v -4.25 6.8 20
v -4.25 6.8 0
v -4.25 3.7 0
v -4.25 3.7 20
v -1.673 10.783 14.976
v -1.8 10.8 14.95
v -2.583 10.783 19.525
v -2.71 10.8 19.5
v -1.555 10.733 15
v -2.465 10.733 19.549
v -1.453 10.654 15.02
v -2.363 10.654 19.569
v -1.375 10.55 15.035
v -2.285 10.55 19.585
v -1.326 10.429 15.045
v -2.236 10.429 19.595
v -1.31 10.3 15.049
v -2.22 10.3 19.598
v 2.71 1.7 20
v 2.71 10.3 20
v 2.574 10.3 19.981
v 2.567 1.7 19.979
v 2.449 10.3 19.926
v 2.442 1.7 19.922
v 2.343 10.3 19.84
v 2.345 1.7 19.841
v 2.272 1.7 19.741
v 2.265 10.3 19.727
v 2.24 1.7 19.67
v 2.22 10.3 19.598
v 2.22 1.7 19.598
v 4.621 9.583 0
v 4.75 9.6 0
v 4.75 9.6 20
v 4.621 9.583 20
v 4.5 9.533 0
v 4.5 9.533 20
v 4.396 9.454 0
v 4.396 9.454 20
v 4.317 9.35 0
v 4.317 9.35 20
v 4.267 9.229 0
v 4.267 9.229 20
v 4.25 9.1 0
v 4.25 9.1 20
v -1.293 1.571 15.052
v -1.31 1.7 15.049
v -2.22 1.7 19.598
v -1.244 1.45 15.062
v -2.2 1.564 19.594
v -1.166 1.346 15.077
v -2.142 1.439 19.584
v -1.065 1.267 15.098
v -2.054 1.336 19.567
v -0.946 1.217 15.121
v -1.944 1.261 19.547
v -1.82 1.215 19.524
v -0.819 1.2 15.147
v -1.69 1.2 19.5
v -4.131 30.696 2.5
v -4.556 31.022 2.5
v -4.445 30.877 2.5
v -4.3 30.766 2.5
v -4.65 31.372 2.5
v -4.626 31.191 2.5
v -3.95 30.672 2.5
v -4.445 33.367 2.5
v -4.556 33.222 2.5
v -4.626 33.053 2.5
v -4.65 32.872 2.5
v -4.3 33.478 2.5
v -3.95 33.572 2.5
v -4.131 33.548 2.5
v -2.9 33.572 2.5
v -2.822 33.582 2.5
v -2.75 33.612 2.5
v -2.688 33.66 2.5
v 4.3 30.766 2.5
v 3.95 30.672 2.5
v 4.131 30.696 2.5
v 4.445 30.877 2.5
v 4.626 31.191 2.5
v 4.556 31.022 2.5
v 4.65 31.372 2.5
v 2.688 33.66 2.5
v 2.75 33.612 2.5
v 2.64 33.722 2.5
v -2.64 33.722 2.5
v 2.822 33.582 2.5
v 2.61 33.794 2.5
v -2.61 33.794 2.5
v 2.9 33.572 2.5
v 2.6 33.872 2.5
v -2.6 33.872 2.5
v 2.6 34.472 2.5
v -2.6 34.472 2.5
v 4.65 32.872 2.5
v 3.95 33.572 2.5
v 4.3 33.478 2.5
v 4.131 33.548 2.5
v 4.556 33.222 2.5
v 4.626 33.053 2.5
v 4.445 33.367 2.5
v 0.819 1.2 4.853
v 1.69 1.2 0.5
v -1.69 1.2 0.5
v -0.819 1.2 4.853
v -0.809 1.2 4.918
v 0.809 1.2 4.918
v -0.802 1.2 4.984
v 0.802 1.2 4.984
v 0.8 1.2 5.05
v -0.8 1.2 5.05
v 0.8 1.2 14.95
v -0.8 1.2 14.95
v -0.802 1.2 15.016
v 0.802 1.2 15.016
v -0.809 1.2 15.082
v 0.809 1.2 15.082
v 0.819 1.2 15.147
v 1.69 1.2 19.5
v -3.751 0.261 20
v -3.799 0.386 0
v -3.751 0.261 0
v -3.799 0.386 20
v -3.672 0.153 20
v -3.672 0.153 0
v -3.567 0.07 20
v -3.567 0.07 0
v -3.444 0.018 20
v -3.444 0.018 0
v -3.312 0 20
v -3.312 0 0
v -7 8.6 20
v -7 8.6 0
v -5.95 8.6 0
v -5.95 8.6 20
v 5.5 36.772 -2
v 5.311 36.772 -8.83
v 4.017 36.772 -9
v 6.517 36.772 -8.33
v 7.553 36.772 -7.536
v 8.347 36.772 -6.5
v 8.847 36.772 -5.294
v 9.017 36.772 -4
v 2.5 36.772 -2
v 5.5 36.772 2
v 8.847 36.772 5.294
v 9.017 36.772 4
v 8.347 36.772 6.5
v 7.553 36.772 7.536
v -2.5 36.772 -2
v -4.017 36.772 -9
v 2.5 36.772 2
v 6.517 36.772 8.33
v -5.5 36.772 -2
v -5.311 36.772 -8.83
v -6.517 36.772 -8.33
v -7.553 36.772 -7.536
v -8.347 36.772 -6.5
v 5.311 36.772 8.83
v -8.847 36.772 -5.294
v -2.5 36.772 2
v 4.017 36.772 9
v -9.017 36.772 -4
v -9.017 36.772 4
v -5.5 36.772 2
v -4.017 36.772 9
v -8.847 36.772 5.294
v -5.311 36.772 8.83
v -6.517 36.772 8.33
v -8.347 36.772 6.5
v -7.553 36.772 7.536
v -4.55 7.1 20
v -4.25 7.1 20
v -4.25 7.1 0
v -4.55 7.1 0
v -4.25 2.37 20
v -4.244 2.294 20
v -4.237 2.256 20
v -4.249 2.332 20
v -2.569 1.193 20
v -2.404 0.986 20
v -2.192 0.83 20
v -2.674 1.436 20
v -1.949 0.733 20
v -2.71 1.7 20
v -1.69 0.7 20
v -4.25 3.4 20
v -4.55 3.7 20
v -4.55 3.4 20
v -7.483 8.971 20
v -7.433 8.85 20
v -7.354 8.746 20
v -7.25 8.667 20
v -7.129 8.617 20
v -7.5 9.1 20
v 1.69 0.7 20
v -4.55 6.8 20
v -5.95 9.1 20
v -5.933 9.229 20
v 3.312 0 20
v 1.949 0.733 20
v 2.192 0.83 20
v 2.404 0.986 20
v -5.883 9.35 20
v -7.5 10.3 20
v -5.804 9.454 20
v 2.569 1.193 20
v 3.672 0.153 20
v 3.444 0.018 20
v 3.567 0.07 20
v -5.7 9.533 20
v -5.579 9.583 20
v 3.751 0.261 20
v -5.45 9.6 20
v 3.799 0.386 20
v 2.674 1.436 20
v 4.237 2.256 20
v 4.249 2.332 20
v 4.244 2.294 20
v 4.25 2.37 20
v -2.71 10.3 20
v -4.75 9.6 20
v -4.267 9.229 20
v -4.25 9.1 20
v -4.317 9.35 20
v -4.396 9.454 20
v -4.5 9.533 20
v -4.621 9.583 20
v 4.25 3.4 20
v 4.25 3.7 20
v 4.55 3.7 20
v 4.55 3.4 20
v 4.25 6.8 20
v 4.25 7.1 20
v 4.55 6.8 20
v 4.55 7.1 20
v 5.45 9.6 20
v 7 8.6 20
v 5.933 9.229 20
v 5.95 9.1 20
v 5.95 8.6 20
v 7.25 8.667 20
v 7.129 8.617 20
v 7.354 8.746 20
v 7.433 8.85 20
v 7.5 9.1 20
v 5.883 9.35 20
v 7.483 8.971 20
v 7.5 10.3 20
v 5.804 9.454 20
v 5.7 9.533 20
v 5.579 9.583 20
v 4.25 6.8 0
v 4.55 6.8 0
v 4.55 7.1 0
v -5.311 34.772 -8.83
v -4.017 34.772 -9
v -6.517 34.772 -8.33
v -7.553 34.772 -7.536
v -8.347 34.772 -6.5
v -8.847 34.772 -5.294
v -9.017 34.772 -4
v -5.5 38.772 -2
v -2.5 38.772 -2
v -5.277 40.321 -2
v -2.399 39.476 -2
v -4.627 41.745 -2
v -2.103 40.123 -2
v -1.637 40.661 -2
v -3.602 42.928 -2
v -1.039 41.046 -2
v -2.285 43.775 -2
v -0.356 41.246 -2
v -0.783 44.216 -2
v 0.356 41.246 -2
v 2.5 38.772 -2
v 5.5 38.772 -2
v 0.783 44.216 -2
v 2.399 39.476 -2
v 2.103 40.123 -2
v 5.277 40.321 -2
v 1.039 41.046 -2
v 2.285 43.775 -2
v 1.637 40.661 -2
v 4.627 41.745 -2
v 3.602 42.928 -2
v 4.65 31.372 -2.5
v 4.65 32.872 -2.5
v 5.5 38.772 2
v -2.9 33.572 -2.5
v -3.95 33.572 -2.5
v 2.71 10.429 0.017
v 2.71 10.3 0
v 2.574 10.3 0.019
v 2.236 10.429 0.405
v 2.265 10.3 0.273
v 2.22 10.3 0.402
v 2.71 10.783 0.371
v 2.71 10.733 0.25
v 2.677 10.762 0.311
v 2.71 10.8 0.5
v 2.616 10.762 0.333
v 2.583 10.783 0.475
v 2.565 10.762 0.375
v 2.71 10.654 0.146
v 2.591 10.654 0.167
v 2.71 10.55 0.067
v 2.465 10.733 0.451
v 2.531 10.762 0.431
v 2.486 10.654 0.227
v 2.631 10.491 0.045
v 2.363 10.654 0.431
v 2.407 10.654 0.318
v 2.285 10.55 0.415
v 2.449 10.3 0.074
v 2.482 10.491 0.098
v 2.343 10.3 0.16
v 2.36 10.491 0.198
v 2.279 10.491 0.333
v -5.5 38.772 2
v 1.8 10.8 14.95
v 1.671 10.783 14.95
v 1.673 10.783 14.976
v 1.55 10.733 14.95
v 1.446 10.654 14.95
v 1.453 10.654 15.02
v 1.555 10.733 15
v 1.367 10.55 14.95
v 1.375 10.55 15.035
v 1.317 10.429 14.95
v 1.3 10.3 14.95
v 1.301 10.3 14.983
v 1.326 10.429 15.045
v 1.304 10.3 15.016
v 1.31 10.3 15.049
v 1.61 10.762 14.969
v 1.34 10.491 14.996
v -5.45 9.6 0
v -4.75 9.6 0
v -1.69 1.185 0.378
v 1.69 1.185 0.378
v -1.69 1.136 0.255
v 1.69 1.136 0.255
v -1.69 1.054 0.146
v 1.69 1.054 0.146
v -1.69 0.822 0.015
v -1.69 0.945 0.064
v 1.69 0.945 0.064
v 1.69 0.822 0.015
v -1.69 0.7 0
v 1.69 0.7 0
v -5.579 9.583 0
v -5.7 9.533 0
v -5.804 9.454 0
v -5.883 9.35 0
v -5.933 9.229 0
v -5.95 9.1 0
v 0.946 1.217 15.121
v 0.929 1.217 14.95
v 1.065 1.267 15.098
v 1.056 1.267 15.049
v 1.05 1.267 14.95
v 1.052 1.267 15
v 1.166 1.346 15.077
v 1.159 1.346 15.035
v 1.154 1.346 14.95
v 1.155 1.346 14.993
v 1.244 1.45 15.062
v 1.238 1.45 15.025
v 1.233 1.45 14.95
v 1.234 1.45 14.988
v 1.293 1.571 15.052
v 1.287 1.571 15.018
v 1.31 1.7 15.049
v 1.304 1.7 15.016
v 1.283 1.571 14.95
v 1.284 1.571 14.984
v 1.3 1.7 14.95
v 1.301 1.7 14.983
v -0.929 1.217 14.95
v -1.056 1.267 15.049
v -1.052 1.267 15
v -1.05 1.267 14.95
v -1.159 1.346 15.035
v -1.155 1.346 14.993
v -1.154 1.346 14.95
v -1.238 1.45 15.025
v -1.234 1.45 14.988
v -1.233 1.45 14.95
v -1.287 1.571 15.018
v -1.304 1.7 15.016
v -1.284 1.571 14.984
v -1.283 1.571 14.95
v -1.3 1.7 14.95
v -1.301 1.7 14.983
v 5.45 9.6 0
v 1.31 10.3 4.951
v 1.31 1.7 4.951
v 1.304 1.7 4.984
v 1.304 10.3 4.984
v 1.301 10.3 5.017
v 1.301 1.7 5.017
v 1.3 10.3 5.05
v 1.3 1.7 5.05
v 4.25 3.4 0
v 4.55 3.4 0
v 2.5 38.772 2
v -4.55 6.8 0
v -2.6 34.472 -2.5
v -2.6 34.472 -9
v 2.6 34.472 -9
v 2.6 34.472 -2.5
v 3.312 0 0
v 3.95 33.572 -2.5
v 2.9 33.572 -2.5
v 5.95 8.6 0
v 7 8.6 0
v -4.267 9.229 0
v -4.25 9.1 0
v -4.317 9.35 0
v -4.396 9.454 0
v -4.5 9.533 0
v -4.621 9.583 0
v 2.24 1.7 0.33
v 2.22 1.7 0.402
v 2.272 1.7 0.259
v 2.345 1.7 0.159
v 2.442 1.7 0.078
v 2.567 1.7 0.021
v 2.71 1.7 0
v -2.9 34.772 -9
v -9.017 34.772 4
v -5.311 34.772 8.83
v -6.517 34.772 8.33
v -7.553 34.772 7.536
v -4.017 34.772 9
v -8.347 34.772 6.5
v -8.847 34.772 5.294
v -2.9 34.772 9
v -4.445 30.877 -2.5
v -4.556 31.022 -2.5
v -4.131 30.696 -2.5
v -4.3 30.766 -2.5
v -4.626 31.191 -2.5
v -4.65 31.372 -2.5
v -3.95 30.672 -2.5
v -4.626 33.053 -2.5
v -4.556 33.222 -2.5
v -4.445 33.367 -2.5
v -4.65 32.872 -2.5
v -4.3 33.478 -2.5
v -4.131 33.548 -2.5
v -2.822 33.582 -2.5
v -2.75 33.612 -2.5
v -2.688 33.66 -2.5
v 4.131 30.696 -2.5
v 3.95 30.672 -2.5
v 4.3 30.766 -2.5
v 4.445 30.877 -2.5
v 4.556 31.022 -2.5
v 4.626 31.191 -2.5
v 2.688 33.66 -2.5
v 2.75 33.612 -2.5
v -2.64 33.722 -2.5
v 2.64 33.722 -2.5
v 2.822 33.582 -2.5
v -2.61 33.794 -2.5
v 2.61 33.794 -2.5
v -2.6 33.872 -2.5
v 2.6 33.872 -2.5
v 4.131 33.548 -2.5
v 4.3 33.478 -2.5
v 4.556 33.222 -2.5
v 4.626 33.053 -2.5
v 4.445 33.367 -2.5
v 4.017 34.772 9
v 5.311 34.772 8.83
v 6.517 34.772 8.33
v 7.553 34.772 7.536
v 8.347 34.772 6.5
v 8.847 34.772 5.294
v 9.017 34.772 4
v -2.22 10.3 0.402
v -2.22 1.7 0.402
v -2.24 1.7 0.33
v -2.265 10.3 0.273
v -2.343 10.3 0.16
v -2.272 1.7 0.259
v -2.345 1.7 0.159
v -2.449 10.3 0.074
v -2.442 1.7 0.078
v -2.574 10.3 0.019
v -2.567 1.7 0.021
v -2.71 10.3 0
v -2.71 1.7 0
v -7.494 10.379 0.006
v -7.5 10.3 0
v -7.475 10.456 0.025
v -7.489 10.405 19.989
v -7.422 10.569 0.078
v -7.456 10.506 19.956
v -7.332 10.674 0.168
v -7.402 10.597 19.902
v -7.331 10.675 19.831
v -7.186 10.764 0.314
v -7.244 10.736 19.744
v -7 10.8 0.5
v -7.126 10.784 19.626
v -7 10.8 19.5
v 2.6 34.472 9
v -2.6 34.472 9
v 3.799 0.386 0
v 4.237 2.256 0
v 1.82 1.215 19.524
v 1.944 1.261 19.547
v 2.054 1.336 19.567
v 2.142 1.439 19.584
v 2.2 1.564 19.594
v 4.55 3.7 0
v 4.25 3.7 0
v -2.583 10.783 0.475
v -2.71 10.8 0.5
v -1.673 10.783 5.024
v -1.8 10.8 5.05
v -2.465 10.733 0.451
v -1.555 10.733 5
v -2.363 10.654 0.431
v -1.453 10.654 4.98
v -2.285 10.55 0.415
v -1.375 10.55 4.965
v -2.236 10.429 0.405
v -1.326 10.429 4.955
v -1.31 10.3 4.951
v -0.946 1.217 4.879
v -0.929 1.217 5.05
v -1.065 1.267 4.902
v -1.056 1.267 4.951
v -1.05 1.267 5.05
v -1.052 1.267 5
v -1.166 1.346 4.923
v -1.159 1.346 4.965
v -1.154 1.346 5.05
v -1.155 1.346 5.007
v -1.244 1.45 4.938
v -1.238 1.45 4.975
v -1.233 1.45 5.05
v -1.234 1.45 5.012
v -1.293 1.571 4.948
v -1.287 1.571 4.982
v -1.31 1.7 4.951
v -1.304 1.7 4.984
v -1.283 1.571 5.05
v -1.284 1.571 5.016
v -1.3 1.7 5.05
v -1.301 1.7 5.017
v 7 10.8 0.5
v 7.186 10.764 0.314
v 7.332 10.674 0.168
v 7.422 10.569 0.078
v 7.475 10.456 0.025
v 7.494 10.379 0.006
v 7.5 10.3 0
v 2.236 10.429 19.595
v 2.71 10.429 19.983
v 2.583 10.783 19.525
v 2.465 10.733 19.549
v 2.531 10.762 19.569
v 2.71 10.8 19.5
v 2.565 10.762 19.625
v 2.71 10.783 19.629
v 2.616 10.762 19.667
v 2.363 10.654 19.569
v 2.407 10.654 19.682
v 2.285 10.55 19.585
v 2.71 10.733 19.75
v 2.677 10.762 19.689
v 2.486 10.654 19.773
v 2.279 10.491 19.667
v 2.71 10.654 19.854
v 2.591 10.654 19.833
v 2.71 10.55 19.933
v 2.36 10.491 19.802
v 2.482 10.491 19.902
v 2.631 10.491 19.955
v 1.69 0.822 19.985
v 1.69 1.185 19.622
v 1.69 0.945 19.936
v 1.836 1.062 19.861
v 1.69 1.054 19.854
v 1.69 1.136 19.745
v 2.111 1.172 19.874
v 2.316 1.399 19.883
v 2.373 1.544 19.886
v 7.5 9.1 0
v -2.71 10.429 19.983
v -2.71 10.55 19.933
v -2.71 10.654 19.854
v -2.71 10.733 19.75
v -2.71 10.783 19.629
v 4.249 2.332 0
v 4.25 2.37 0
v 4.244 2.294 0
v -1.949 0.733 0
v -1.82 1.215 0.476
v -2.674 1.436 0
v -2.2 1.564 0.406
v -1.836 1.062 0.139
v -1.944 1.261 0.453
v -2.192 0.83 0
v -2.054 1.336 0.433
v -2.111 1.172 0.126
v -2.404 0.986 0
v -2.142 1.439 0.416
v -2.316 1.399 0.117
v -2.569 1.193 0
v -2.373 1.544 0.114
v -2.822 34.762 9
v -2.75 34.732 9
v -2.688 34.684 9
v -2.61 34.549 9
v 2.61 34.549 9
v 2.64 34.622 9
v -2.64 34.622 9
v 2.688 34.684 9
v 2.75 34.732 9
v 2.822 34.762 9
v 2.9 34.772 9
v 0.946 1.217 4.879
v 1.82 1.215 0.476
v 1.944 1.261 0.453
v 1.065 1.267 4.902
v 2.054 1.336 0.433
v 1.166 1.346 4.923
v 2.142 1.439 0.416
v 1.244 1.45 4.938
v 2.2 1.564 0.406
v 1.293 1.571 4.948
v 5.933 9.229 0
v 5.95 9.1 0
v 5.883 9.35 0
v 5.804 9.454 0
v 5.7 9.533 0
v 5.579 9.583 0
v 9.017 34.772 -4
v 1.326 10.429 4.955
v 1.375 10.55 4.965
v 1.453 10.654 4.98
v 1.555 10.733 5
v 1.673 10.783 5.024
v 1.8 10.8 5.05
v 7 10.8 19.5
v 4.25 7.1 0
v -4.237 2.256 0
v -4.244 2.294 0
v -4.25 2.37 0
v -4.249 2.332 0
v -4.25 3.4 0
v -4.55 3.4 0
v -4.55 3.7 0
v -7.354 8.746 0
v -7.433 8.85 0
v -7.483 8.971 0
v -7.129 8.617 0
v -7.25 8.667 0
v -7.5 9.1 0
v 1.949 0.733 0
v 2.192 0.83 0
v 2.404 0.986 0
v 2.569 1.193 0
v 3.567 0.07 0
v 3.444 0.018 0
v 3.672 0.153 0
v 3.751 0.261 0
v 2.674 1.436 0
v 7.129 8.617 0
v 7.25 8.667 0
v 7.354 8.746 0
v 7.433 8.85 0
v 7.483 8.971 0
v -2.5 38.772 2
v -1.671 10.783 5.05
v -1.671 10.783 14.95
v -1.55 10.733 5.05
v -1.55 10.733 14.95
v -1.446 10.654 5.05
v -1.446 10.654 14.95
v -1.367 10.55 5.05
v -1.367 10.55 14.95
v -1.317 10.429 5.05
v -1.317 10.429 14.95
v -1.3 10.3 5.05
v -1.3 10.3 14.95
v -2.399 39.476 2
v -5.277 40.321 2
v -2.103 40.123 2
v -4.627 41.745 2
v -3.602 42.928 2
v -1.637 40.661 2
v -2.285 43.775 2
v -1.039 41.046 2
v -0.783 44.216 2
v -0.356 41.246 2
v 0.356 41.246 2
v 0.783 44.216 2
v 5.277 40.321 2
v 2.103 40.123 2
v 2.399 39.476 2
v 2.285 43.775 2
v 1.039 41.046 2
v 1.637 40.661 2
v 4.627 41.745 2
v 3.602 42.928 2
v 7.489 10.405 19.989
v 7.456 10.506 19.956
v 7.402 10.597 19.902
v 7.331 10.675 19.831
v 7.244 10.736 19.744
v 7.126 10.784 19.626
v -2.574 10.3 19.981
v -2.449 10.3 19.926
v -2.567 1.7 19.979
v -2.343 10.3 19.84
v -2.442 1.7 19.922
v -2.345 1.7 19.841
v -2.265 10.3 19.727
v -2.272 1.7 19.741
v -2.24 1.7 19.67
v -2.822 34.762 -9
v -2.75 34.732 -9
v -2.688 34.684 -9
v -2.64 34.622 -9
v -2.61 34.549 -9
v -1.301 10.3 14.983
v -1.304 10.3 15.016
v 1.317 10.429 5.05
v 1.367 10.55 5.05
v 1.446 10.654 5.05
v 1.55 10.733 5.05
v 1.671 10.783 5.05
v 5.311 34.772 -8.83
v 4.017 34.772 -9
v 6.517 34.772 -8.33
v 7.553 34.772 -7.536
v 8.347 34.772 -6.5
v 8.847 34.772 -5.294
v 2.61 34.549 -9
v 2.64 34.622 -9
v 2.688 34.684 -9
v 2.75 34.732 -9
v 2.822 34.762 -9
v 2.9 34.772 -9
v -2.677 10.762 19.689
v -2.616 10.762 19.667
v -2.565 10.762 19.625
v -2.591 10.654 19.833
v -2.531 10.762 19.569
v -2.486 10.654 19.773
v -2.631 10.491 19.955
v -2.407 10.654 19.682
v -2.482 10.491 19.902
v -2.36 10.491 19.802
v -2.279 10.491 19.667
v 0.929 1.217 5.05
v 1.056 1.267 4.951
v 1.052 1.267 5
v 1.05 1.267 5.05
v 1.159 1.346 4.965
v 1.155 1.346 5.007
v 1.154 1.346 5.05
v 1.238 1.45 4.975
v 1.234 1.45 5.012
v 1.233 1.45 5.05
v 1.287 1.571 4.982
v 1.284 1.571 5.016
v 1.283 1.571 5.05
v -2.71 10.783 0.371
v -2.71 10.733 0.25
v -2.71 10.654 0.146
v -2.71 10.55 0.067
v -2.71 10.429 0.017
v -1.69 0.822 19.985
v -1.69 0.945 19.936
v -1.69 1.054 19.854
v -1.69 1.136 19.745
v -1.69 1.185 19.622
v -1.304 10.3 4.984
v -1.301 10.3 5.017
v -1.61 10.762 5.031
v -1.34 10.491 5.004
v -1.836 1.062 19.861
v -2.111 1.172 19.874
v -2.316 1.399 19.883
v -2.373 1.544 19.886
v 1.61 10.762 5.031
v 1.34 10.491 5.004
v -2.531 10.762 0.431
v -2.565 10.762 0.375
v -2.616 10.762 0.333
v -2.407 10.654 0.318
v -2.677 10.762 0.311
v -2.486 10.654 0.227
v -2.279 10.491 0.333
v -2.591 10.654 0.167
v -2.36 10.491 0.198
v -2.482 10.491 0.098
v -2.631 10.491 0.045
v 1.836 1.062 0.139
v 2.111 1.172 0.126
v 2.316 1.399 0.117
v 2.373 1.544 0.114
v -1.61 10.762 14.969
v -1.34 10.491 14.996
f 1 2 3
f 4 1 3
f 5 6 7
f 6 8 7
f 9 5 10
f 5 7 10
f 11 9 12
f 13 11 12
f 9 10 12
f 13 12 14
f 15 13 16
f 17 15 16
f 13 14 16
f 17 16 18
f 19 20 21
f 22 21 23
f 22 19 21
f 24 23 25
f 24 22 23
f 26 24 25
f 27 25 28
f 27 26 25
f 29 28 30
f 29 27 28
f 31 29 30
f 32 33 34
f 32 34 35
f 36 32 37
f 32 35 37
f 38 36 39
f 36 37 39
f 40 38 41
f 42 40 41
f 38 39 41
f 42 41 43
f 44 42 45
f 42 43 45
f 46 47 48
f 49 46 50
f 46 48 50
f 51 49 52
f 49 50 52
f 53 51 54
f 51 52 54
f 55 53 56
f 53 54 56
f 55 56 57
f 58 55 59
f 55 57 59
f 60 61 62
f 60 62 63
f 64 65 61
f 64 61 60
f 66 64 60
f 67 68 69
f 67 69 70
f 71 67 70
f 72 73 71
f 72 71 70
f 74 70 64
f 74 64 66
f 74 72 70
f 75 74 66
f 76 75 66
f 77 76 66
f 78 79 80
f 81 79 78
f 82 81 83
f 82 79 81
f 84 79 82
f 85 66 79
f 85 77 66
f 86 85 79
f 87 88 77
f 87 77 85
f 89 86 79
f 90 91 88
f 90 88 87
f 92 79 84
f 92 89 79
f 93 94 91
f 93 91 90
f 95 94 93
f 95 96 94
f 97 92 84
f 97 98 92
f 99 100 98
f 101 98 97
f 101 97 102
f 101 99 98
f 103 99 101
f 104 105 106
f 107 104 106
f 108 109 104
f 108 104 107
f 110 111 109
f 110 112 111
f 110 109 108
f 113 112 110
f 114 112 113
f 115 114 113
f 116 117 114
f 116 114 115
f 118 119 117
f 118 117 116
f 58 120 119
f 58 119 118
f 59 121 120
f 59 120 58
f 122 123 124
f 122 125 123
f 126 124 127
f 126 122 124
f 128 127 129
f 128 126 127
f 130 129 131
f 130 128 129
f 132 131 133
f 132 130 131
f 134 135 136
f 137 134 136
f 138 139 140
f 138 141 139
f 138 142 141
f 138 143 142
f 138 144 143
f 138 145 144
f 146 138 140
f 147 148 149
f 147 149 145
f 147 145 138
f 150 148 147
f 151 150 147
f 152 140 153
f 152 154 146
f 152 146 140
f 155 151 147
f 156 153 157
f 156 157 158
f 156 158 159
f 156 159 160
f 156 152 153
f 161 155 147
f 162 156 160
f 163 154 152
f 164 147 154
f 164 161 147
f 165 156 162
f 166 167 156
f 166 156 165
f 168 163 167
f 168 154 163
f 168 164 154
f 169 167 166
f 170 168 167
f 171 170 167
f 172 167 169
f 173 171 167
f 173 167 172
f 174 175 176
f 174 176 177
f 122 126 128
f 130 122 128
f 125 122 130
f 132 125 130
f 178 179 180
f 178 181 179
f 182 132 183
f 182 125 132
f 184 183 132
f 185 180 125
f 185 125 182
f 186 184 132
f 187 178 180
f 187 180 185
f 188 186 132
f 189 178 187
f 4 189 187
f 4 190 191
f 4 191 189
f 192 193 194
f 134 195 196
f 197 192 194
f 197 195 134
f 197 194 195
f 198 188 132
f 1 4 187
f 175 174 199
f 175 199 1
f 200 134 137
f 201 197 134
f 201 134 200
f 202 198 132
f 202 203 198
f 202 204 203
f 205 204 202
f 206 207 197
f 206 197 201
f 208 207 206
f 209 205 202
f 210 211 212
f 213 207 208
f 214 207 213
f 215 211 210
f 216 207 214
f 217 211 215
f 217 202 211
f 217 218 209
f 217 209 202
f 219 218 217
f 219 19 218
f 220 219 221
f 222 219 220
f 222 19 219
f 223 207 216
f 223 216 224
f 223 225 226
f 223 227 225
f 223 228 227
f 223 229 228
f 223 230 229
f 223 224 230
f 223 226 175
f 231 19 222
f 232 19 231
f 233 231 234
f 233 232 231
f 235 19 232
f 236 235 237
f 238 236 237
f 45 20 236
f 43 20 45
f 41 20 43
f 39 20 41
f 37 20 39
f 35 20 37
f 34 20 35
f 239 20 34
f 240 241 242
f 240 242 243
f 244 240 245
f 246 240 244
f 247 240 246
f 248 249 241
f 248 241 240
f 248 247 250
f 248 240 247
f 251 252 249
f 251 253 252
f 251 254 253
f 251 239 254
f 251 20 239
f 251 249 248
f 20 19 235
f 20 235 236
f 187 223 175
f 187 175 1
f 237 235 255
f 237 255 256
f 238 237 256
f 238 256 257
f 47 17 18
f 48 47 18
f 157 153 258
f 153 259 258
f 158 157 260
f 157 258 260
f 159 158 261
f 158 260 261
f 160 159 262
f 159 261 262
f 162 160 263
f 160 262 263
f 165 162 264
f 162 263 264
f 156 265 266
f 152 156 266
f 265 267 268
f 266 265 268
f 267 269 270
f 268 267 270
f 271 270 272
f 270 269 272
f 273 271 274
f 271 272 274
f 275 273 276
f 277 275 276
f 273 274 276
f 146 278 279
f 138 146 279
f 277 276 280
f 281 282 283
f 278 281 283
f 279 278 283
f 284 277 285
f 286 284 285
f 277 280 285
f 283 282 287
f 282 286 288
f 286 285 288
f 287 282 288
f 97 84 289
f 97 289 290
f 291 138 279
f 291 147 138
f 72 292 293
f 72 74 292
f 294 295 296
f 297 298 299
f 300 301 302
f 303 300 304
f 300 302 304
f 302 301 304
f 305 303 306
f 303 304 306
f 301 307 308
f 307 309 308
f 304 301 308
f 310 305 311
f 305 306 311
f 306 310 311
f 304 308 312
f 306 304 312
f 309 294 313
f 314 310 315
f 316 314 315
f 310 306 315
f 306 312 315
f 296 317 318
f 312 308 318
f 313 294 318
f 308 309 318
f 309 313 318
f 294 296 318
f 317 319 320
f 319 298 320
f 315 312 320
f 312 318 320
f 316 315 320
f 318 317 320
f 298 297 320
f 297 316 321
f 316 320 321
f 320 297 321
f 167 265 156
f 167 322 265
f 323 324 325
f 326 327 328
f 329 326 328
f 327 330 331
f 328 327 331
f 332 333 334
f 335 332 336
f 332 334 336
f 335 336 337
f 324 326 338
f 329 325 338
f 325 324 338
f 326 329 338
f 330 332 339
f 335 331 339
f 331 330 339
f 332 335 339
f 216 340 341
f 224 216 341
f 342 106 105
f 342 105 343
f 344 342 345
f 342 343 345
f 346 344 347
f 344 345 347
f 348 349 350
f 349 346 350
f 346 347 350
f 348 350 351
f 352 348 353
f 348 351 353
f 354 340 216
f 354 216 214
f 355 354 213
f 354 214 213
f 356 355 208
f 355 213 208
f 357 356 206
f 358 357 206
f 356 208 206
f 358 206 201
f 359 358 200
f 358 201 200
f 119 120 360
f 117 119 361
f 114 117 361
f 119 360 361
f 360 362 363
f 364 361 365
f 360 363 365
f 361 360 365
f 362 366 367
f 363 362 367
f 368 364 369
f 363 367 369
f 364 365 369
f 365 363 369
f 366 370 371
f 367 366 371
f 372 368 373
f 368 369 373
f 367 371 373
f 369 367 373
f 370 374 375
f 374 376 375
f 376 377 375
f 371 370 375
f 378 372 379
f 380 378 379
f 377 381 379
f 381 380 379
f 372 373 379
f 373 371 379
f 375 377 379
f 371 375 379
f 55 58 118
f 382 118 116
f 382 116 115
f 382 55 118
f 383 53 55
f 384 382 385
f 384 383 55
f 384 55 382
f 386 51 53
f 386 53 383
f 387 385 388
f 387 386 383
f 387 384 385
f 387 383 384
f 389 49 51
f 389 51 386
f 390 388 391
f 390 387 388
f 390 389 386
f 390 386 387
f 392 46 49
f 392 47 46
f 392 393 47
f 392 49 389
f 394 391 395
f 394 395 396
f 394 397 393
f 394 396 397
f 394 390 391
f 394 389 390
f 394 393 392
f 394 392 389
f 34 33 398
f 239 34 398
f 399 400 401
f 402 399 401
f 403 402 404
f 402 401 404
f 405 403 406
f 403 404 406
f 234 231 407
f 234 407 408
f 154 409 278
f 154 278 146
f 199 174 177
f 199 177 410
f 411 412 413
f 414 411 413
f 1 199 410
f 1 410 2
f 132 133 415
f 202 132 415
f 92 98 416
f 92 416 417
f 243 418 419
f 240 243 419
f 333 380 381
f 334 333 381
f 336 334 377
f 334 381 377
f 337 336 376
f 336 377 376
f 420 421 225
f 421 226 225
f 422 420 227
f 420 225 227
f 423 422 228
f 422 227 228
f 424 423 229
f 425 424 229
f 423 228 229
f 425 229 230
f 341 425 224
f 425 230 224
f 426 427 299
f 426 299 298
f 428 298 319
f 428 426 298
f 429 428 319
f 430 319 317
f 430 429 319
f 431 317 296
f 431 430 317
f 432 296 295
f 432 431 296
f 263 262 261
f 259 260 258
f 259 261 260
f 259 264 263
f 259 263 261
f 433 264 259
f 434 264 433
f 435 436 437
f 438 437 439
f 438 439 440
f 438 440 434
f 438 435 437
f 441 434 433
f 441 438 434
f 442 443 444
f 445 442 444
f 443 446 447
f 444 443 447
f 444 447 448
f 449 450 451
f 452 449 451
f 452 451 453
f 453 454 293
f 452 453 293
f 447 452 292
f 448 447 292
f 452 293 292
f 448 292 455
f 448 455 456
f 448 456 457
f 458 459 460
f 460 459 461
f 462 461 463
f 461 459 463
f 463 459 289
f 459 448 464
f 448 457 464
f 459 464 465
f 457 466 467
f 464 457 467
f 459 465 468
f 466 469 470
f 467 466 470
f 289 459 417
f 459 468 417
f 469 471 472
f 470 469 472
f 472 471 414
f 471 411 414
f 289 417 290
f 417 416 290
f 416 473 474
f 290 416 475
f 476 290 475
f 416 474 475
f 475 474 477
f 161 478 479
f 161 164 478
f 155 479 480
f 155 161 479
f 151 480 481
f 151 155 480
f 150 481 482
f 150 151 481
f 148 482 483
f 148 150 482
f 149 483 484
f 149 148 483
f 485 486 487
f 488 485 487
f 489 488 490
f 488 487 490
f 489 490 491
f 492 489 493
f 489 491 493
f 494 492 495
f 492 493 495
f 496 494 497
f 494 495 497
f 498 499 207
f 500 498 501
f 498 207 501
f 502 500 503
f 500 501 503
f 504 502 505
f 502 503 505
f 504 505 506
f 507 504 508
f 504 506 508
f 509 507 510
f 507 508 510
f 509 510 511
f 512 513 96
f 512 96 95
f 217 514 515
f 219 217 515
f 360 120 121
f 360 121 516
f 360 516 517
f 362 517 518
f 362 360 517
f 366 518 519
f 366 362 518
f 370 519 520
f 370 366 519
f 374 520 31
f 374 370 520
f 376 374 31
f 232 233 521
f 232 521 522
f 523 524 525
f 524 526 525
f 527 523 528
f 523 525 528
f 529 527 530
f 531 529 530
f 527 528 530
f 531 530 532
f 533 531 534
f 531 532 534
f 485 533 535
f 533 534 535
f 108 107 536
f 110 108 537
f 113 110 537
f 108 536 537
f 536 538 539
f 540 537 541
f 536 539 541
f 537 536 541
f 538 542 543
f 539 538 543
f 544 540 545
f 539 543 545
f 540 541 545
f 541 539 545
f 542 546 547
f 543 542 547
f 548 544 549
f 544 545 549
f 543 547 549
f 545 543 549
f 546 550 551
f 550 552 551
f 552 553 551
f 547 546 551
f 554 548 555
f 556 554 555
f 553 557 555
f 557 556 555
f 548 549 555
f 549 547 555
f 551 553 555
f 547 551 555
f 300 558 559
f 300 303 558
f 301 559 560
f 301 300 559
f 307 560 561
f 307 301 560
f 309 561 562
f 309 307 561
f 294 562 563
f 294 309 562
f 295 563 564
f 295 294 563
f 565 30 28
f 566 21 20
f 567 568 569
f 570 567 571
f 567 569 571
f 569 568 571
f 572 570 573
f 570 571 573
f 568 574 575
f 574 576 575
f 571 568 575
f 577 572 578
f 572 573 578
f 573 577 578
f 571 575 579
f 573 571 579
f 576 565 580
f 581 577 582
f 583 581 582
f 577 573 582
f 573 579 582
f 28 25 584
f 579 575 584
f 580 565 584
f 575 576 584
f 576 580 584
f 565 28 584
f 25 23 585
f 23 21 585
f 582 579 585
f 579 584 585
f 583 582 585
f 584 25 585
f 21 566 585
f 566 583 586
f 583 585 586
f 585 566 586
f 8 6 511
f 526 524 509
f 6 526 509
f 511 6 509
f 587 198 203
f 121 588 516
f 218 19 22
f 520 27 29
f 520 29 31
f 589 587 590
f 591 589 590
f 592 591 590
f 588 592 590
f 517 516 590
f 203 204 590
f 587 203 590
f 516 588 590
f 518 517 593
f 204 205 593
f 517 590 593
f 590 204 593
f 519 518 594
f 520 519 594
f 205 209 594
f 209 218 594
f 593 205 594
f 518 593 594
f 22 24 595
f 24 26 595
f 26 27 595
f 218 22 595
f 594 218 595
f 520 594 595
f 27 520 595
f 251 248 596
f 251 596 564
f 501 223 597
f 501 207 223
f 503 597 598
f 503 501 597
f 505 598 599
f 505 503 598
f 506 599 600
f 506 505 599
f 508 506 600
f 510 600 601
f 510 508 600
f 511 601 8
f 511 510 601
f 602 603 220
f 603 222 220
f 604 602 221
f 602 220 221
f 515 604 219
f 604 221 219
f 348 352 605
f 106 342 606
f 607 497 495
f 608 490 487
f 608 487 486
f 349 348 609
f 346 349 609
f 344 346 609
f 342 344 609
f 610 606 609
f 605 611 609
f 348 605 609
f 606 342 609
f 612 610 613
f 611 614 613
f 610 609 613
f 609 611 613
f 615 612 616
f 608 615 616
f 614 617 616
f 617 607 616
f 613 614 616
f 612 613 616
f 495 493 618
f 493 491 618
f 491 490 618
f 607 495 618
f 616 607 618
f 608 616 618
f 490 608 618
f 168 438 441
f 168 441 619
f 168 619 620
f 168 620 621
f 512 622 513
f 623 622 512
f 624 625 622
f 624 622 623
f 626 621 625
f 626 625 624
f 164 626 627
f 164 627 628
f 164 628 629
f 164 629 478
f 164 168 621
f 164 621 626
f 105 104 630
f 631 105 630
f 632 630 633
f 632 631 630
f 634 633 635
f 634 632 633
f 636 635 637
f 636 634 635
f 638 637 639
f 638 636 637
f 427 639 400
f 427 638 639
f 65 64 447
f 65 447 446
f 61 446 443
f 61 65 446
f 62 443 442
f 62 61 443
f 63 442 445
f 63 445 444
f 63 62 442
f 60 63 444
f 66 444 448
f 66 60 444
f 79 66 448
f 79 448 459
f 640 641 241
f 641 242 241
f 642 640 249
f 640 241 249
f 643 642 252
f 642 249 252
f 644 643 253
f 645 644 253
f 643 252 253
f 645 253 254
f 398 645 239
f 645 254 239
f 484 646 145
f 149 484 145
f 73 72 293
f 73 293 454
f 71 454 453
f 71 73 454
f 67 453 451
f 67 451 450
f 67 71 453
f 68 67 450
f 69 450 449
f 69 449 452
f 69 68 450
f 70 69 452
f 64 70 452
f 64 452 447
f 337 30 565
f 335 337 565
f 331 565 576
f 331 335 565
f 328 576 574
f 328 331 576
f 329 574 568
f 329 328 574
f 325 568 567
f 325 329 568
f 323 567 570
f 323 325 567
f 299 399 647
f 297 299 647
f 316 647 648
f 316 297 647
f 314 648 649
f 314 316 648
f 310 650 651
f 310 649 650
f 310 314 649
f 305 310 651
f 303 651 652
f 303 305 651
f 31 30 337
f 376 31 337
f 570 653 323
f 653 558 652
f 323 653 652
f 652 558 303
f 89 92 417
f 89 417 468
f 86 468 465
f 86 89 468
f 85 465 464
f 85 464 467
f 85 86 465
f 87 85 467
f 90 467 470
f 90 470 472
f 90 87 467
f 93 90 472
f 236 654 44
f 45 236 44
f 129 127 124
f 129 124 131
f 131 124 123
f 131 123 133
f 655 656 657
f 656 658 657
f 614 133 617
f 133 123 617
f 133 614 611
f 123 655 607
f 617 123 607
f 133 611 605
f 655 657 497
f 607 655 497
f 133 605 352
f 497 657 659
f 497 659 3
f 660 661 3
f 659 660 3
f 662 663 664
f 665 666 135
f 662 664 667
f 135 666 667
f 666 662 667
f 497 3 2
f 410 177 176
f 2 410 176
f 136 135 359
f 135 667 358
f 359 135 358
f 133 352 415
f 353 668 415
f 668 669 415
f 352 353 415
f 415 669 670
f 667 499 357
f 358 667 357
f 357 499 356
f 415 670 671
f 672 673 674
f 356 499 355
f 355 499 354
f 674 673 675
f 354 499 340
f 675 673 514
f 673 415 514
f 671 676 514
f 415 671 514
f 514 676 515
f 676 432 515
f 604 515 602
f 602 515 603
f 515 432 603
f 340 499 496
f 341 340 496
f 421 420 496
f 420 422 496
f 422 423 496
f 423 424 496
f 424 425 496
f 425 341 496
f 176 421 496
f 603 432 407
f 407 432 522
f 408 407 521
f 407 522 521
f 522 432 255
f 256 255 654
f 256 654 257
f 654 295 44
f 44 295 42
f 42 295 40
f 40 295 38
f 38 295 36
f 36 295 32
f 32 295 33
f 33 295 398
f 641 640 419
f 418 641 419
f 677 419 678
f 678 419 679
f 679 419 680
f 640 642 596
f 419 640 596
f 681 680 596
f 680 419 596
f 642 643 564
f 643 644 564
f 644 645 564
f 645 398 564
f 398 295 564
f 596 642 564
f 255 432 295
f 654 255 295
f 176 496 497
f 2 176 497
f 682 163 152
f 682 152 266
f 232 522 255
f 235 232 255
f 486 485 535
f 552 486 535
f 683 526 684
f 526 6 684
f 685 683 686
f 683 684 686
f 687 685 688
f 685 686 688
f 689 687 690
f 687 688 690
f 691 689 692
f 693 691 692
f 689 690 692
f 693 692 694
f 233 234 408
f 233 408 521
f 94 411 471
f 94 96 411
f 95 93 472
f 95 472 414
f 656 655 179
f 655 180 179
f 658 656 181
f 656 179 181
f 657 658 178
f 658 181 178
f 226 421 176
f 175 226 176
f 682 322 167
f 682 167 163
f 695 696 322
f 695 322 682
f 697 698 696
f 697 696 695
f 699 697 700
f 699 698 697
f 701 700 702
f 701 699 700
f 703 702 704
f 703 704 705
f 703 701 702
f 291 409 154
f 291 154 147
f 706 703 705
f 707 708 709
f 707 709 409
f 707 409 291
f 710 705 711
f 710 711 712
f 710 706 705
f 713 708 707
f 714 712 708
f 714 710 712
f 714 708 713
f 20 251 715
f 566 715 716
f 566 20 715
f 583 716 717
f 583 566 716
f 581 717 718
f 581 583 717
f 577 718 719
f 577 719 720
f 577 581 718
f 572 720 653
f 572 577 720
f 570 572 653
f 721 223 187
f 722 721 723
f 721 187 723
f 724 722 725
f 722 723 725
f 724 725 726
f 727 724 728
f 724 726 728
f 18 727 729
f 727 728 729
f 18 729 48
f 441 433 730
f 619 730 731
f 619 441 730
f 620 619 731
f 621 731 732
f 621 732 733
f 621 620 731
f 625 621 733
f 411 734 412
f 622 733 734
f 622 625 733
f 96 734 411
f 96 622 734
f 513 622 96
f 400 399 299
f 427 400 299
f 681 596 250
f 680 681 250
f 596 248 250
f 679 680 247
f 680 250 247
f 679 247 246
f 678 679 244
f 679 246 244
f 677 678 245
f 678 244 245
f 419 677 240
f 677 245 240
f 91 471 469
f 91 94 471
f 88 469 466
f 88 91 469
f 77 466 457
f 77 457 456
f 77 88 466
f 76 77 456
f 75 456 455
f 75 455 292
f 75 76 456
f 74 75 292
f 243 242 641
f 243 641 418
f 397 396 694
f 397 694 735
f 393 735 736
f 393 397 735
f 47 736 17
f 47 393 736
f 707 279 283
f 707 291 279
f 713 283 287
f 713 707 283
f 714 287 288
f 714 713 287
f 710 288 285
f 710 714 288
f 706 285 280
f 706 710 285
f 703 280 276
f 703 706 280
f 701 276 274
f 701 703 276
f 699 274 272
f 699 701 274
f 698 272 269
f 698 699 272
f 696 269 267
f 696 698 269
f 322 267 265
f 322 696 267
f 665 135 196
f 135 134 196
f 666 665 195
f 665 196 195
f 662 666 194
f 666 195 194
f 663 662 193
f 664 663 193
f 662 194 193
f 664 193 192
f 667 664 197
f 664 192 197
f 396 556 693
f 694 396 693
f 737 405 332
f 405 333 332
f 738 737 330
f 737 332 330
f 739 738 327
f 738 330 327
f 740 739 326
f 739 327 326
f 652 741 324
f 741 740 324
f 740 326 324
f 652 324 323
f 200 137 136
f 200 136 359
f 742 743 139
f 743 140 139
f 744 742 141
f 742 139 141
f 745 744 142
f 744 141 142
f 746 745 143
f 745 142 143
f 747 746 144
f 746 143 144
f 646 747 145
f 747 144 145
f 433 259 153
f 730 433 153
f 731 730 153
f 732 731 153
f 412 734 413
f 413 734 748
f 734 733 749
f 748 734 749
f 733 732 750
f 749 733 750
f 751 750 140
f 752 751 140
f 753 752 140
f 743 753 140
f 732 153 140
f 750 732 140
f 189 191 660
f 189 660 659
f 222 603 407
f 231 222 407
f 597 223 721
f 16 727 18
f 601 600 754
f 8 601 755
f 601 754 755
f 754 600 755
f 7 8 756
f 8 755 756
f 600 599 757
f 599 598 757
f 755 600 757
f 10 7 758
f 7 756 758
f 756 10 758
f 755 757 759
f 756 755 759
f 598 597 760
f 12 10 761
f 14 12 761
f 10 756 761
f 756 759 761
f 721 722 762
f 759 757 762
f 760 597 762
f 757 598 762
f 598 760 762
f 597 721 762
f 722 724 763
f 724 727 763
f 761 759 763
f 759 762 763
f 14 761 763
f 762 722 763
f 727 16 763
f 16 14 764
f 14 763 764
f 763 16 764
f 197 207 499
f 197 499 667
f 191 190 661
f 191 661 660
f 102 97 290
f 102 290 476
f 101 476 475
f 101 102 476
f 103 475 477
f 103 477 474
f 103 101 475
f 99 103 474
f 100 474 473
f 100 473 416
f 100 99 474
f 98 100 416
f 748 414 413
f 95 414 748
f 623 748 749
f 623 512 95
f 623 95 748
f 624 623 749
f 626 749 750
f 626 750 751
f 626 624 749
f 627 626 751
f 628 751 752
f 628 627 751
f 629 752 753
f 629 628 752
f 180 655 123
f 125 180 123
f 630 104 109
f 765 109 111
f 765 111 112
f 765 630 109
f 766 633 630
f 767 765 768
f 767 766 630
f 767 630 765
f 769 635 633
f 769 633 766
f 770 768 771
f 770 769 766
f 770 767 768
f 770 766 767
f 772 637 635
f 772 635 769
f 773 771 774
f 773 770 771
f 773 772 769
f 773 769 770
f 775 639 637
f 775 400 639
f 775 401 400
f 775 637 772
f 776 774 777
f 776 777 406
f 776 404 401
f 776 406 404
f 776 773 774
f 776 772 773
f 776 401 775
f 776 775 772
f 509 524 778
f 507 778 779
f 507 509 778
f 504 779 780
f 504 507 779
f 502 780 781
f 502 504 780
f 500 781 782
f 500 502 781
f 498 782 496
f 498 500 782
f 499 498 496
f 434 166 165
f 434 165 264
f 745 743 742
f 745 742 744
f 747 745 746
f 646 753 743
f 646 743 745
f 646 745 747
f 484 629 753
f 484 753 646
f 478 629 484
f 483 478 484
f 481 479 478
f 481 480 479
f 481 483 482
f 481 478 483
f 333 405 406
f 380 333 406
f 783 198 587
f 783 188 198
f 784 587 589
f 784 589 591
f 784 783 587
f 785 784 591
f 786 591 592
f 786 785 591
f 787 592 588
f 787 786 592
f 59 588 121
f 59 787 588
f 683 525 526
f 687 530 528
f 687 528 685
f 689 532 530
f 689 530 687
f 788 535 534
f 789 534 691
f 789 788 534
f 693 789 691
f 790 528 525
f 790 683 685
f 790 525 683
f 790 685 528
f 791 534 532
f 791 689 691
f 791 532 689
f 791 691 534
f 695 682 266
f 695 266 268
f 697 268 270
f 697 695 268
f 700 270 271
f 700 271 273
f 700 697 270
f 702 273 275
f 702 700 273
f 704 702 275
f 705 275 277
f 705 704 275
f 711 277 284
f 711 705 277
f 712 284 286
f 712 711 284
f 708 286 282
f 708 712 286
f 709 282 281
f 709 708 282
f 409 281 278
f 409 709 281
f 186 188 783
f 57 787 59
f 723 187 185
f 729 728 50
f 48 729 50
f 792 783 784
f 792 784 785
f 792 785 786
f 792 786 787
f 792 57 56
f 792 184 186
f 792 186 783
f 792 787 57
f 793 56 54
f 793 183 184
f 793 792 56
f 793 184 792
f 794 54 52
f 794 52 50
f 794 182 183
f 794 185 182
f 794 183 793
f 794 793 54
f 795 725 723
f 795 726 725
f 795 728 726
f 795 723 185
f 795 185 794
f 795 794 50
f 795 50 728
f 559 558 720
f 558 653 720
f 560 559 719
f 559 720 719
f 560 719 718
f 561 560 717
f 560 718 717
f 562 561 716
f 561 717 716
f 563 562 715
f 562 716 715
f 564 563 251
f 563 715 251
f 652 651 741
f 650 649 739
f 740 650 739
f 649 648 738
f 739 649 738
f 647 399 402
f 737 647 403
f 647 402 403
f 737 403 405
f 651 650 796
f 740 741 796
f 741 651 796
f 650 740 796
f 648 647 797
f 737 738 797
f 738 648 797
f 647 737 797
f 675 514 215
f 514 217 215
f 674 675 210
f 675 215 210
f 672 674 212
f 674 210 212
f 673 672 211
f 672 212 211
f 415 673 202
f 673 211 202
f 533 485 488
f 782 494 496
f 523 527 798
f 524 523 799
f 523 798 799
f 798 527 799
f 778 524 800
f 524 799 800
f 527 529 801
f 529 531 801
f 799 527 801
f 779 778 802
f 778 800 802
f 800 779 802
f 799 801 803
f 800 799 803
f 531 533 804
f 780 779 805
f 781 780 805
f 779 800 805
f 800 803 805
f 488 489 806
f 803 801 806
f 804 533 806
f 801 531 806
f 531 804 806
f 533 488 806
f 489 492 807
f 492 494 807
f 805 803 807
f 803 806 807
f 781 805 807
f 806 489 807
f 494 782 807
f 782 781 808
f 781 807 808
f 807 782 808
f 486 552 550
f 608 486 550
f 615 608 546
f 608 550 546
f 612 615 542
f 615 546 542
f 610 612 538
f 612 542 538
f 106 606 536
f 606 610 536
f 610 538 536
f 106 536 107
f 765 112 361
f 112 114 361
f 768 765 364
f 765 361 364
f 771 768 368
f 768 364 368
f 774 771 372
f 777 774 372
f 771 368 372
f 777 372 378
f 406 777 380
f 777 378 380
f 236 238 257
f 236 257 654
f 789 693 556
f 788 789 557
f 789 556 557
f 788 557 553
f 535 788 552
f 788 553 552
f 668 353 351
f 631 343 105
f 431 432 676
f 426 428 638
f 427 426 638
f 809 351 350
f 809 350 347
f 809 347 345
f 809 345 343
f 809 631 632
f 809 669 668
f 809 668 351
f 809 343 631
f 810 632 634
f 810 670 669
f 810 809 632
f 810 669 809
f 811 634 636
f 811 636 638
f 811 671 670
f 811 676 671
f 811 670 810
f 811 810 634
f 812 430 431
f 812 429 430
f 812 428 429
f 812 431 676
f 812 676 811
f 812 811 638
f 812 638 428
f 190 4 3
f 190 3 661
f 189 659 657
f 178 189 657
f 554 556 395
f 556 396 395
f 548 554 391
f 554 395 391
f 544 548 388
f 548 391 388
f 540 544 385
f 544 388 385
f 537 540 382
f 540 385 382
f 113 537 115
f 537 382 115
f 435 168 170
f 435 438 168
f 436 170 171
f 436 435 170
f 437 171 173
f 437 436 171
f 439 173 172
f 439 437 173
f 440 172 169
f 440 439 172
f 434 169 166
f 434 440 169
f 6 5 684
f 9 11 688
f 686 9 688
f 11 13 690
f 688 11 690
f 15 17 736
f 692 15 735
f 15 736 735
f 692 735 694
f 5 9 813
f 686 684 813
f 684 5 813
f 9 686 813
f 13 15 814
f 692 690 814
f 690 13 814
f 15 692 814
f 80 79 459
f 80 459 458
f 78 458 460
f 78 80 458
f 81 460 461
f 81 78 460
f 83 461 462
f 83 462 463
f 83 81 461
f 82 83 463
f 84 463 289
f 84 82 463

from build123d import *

# Parameters (mm, degrees)
F1_DEPTH = 20
F3_DEPTH = 9.6
F4_R     = 0.5
F6_DEPTH = 2.5
F7_DEPTH = 9
F8_DEPTH = 2
F9_R     = 5


# Not quite as in the source:
# - a feature names something its author has since deleted; it is built from what else it names


with BuildPart() as f1:
    # F0 (on Top) → F1 (new body)
    with BuildSketch(Plane.XY):
        Polygon((-4.25, 2.3122045677), (-3.7083309144, 0), (3.7083309144, 0), (4.25, 2.3122045677), (4.25, 3.4), (4.55, 3.4), (4.55, 3.7), (4.25, 3.7), (4.25, 6.8), (4.55, 6.8), (4.55, 7.1), (4.25, 7.1), (4.25, 9.6), (5.95, 9.6), (5.95, 8.6), (7.5, 8.6), (7.5, 10.8), (1.3, 10.8), (1.3, 1.2), (-1.3, 1.2), (-1.3, 10.8), (-7.5, 10.8), (-7.5, 8.6), (-5.95, 8.6), (-5.95, 9.6), (-4.25, 9.6), (-4.25, 7.1), (-4.55, 7.1), (-4.55, 6.8), (-4.25, 6.8), (-4.25, 3.7), (-4.55, 3.7), (-4.55, 3.4), (-4.25, 3.4), align=None)
    extrude(amount=F1_DEPTH)

    # F2 (on face) → F3 (cut)
    with BuildSketch(Plane(origin=(0, 10.8, 0), x_dir=(-1, 0, 0), z_dir=(0, 1, 0))):
        Polygon((2.3, 0), (1.3, 5), (1.3, 0), align=None)
        Polygon((-2.3, 0), (-1.3, 0), (-1.3, 5), align=None)
        Polygon((-2.3, 20), (-1.3, 15), (-1.3, 20), align=None)
        Polygon((2.3, 20), (1.3, 20), (1.3, 15), align=None)
    extrude(amount=-F3_DEPTH, mode=Mode.SUBTRACT)

    # F4
    f4_edges = [f1.edges().sort_by_distance(p)[0] for p in [
        (4.9, 10.8, 0),
        (1.8, 10.8, 2.5),
        (1.3, 10.8, 10),
        (1.8, 10.8, 17.5),
        (4.9, 10.8, 20),
        (7.5, 10.8, 10),
        (-1.8, 10.8, 2.5),
        (-4.9, 10.8, 0),
        (-7.5, 10.8, 10),
        (-4.9, 10.8, 20),
        (-1.8, 10.8, 17.5),
        (-1.3, 10.8, 10),
        (-2.3, 6, 0),
        (-1.3, 6, 5),
        (-1.8, 1.2, 2.5),
        (1.3, 6, 5),
        (2.3, 6, 0),
        (1.8, 1.2, 2.5),
        (2.3, 6, 20),
        (1.3, 6, 15),
        (1.8, 1.2, 17.5),
        (-1.3, 6, 15),
        (-2.3, 6, 20),
        (-1.8, 1.2, 17.5),
        (-4.25, 9.6, 10),
        (-5.95, 9.6, 10),
        (4.25, 9.6, 10),
        (5.95, 9.6, 10),
        (-7.5, 8.6, 10),
        (7.5, 8.6, 10),
        (3.708331, 0, 10),
        (4.25, 2.312205, 10),
        (-4.25, 2.312205, 10),
        (-3.708331, 0, 10),
        (0, 1.2, 20),
        (-1.3, 1.2, 10),
        (1.3, 1.2, 10),
        (0, 1.2, 0),
    ]]
    fillet(f4_edges, radius=F4_R)


with BuildPart() as f6:
    # F5 (on Top) → F6 (new body, symmetric)
    with BuildSketch(Plane.XY):
        with BuildLine():
            Line((-2.9, 33.5718078229), (-3.95, 33.5718078229))
            ThreePointArc((-3.95, 33.5718078229), (-4.4449747468, 33.3667825697), (-4.65, 32.8718078229))
            Line((-4.65, 32.8718078229), (-4.65, 31.3718078229))
            ThreePointArc((-4.65, 31.3718078229), (-4.4449747468, 30.876833076), (-3.95, 30.6718078229))
            Line((-3.95, 30.6718078229), (3.95, 30.6718078229))
            ThreePointArc((3.95, 30.6718078229), (4.4449747468, 30.876833076), (4.65, 31.3718078229))
            Line((4.65, 31.3718078229), (4.65, 32.8718078229))
            ThreePointArc((4.65, 32.8718078229), (4.4449747468, 33.3667825697), (3.95, 33.5718078229))
            Line((3.95, 33.5718078229), (2.9, 33.5718078229))
            ThreePointArc((2.9, 33.5718078229), (2.6878679656, 33.6596757885), (2.6, 33.8718078229))
            Line((2.6, 33.8718078229), (2.6, 34.4718078229))
            Line((2.6, 34.4718078229), (-2.6, 34.4718078229))
            Line((-2.6, 34.4718078229), (-2.6, 33.8718078229))
            ThreePointArc((-2.6, 33.8718078229), (-2.6878679656, 33.6596757885), (-2.9, 33.5718078229))
        make_face()
        with BuildLine():
            ThreePointArc((-2.9, 34.7718078229), (-2.6878679656, 34.6839398572), (-2.6, 34.4718078229))
            Line((-2.6, 34.4718078229), (2.6, 34.4718078229))
            ThreePointArc((2.6, 34.4718078229), (2.6878679656, 34.6839398572), (2.9, 34.7718078229))
            Line((2.9, 34.7718078229), (2.75, 34.7718078229))
            Line((2.75, 34.7718078229), (-2.75, 34.7718078229))
            Line((-2.75, 34.7718078229), (-2.9, 34.7718078229))
        make_face()
    extrude(amount=F6_DEPTH, both=True)

    # F5 (on Top) → F7 (join, symmetric)
    with BuildSketch(Plane.XY):
        Polygon((-9.0172681957, 34.7718078229), (-2.9, 34.7718078229), (-2.75, 34.7718078229), (2.75, 34.7718078229), (2.9, 34.7718078229), (9.0172681957, 34.7718078229), (9.0172681957, 36.7718078229), (5.5, 36.7718078229), (2.5, 36.7718078229), (-2.5, 36.7718078229), (-5.5, 36.7718078229), (-9.0172681957, 36.7718078229), align=None)
        with BuildLine():
            ThreePointArc((-2.9, 34.7718078229), (-2.6878679656, 34.6839398572), (-2.6, 34.4718078229))
            Line((-2.6, 34.4718078229), (2.6, 34.4718078229))
            ThreePointArc((2.6, 34.4718078229), (2.6878679656, 34.6839398572), (2.9, 34.7718078229))
            Line((2.9, 34.7718078229), (2.75, 34.7718078229))
            Line((2.75, 34.7718078229), (-2.75, 34.7718078229))
            Line((-2.75, 34.7718078229), (-2.9, 34.7718078229))
        make_face()
    extrude(amount=F7_DEPTH, both=True)

    # F5 (on Top) → F8 (join, symmetric)
    with BuildSketch(Plane.XY):
        with BuildLine():
            Line((-5.5, 38.7718078229), (-5.5, 36.7718078229))
            Line((-5.5, 36.7718078229), (-2.5, 36.7718078229))
            Line((-2.5, 36.7718078229), (-2.5, 38.7718078229))
            ThreePointArc((-2.5, 38.7718078229), (0, 41.2718078229), (2.5, 38.7718078229))
            Line((2.5, 38.7718078229), (2.5, 36.7718078229))
            Line((2.5, 36.7718078229), (5.5, 36.7718078229))
            Line((5.5, 36.7718078229), (5.5, 38.7718078229))
            ThreePointArc((5.5, 38.7718078229), (0, 44.2718078229), (-5.5, 38.7718078229))
        make_face()
    extrude(amount=F8_DEPTH, both=True)

    # F9
    f9_edges = [f6.edges().sort_by_distance(p)[0] for p in [
        (-9.017268, 35.771808, 9),
        (-9.017268, 35.771808, -9),
        (9.017268, 35.771808, 9),
        (9.017268, 35.771808, -9),
    ]]
    fillet(f9_edges, radius=F9_R)


solid = Compound([f1.part, f6.part])
